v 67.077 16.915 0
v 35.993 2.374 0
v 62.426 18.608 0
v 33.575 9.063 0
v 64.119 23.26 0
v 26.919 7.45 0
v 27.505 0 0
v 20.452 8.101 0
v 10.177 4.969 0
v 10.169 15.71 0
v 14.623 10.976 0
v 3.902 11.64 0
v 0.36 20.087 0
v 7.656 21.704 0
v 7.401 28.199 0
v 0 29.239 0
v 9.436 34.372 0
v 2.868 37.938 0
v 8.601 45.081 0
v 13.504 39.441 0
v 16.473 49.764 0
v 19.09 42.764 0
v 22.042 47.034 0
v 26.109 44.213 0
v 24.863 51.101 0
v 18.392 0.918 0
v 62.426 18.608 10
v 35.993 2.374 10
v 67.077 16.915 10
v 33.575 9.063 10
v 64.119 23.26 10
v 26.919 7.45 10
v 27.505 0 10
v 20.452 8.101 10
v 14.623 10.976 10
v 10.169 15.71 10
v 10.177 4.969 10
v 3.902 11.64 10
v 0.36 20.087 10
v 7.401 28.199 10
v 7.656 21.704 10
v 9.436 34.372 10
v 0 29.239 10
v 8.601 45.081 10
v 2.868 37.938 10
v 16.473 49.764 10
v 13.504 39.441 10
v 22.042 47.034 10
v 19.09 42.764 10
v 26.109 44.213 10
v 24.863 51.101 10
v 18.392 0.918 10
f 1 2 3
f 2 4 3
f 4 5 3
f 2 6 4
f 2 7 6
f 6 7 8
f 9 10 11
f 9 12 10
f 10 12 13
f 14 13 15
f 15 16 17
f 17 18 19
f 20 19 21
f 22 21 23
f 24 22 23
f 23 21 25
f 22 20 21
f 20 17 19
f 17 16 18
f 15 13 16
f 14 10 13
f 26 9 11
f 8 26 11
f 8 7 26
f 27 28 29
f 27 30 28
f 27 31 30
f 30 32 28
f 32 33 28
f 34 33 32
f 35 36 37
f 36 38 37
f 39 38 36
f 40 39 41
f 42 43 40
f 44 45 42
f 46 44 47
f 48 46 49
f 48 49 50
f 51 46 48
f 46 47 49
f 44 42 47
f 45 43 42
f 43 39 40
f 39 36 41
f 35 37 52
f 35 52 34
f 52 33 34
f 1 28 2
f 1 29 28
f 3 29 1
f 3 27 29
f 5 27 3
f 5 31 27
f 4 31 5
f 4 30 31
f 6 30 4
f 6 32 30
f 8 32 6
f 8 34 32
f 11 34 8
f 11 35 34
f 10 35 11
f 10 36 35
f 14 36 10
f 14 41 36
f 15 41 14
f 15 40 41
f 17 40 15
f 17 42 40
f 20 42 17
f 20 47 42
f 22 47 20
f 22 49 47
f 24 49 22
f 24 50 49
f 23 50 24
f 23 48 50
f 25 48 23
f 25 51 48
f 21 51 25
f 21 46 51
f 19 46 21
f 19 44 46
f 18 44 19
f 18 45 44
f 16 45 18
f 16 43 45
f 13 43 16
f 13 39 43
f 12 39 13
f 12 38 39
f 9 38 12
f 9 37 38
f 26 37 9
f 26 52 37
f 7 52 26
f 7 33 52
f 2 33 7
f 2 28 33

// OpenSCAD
$fn = 32;

// ----------------------------------------------------------------------
// Hook plate: curl radius 22 mm over 205 degrees, 7 mm thick band
// ----------------------------------------------------------------------

// --- parameters (mm) ---
profile_height = 10;      // extrusion height
profile_points = 26;      // points of the closed outline

profile = [[22.042, 47.034], [24.863, 51.101], [16.473, 49.764], [8.601, 45.081], [2.868, 37.938], [0, 29.239], [0.36, 20.087], [3.902, 11.64], [10.177, 4.969], [18.392, 0.918], [27.505, 0], [35.993, 2.374], [67.077, 16.915], [62.426, 18.608], [64.119, 23.26], [33.575, 9.063], [26.919, 7.45], [20.452, 8.101], [14.623, 10.976], [10.169, 15.71], [7.656, 21.704], [7.401, 28.199], [9.436, 34.372], [13.504, 39.441], [19.09, 42.764], [26.109, 44.213]];  // single closed polygon, 26 points, counter clockwise

// --- the one profile operation ---
linear_extrude(height = profile_height) polygon(points = profile);
